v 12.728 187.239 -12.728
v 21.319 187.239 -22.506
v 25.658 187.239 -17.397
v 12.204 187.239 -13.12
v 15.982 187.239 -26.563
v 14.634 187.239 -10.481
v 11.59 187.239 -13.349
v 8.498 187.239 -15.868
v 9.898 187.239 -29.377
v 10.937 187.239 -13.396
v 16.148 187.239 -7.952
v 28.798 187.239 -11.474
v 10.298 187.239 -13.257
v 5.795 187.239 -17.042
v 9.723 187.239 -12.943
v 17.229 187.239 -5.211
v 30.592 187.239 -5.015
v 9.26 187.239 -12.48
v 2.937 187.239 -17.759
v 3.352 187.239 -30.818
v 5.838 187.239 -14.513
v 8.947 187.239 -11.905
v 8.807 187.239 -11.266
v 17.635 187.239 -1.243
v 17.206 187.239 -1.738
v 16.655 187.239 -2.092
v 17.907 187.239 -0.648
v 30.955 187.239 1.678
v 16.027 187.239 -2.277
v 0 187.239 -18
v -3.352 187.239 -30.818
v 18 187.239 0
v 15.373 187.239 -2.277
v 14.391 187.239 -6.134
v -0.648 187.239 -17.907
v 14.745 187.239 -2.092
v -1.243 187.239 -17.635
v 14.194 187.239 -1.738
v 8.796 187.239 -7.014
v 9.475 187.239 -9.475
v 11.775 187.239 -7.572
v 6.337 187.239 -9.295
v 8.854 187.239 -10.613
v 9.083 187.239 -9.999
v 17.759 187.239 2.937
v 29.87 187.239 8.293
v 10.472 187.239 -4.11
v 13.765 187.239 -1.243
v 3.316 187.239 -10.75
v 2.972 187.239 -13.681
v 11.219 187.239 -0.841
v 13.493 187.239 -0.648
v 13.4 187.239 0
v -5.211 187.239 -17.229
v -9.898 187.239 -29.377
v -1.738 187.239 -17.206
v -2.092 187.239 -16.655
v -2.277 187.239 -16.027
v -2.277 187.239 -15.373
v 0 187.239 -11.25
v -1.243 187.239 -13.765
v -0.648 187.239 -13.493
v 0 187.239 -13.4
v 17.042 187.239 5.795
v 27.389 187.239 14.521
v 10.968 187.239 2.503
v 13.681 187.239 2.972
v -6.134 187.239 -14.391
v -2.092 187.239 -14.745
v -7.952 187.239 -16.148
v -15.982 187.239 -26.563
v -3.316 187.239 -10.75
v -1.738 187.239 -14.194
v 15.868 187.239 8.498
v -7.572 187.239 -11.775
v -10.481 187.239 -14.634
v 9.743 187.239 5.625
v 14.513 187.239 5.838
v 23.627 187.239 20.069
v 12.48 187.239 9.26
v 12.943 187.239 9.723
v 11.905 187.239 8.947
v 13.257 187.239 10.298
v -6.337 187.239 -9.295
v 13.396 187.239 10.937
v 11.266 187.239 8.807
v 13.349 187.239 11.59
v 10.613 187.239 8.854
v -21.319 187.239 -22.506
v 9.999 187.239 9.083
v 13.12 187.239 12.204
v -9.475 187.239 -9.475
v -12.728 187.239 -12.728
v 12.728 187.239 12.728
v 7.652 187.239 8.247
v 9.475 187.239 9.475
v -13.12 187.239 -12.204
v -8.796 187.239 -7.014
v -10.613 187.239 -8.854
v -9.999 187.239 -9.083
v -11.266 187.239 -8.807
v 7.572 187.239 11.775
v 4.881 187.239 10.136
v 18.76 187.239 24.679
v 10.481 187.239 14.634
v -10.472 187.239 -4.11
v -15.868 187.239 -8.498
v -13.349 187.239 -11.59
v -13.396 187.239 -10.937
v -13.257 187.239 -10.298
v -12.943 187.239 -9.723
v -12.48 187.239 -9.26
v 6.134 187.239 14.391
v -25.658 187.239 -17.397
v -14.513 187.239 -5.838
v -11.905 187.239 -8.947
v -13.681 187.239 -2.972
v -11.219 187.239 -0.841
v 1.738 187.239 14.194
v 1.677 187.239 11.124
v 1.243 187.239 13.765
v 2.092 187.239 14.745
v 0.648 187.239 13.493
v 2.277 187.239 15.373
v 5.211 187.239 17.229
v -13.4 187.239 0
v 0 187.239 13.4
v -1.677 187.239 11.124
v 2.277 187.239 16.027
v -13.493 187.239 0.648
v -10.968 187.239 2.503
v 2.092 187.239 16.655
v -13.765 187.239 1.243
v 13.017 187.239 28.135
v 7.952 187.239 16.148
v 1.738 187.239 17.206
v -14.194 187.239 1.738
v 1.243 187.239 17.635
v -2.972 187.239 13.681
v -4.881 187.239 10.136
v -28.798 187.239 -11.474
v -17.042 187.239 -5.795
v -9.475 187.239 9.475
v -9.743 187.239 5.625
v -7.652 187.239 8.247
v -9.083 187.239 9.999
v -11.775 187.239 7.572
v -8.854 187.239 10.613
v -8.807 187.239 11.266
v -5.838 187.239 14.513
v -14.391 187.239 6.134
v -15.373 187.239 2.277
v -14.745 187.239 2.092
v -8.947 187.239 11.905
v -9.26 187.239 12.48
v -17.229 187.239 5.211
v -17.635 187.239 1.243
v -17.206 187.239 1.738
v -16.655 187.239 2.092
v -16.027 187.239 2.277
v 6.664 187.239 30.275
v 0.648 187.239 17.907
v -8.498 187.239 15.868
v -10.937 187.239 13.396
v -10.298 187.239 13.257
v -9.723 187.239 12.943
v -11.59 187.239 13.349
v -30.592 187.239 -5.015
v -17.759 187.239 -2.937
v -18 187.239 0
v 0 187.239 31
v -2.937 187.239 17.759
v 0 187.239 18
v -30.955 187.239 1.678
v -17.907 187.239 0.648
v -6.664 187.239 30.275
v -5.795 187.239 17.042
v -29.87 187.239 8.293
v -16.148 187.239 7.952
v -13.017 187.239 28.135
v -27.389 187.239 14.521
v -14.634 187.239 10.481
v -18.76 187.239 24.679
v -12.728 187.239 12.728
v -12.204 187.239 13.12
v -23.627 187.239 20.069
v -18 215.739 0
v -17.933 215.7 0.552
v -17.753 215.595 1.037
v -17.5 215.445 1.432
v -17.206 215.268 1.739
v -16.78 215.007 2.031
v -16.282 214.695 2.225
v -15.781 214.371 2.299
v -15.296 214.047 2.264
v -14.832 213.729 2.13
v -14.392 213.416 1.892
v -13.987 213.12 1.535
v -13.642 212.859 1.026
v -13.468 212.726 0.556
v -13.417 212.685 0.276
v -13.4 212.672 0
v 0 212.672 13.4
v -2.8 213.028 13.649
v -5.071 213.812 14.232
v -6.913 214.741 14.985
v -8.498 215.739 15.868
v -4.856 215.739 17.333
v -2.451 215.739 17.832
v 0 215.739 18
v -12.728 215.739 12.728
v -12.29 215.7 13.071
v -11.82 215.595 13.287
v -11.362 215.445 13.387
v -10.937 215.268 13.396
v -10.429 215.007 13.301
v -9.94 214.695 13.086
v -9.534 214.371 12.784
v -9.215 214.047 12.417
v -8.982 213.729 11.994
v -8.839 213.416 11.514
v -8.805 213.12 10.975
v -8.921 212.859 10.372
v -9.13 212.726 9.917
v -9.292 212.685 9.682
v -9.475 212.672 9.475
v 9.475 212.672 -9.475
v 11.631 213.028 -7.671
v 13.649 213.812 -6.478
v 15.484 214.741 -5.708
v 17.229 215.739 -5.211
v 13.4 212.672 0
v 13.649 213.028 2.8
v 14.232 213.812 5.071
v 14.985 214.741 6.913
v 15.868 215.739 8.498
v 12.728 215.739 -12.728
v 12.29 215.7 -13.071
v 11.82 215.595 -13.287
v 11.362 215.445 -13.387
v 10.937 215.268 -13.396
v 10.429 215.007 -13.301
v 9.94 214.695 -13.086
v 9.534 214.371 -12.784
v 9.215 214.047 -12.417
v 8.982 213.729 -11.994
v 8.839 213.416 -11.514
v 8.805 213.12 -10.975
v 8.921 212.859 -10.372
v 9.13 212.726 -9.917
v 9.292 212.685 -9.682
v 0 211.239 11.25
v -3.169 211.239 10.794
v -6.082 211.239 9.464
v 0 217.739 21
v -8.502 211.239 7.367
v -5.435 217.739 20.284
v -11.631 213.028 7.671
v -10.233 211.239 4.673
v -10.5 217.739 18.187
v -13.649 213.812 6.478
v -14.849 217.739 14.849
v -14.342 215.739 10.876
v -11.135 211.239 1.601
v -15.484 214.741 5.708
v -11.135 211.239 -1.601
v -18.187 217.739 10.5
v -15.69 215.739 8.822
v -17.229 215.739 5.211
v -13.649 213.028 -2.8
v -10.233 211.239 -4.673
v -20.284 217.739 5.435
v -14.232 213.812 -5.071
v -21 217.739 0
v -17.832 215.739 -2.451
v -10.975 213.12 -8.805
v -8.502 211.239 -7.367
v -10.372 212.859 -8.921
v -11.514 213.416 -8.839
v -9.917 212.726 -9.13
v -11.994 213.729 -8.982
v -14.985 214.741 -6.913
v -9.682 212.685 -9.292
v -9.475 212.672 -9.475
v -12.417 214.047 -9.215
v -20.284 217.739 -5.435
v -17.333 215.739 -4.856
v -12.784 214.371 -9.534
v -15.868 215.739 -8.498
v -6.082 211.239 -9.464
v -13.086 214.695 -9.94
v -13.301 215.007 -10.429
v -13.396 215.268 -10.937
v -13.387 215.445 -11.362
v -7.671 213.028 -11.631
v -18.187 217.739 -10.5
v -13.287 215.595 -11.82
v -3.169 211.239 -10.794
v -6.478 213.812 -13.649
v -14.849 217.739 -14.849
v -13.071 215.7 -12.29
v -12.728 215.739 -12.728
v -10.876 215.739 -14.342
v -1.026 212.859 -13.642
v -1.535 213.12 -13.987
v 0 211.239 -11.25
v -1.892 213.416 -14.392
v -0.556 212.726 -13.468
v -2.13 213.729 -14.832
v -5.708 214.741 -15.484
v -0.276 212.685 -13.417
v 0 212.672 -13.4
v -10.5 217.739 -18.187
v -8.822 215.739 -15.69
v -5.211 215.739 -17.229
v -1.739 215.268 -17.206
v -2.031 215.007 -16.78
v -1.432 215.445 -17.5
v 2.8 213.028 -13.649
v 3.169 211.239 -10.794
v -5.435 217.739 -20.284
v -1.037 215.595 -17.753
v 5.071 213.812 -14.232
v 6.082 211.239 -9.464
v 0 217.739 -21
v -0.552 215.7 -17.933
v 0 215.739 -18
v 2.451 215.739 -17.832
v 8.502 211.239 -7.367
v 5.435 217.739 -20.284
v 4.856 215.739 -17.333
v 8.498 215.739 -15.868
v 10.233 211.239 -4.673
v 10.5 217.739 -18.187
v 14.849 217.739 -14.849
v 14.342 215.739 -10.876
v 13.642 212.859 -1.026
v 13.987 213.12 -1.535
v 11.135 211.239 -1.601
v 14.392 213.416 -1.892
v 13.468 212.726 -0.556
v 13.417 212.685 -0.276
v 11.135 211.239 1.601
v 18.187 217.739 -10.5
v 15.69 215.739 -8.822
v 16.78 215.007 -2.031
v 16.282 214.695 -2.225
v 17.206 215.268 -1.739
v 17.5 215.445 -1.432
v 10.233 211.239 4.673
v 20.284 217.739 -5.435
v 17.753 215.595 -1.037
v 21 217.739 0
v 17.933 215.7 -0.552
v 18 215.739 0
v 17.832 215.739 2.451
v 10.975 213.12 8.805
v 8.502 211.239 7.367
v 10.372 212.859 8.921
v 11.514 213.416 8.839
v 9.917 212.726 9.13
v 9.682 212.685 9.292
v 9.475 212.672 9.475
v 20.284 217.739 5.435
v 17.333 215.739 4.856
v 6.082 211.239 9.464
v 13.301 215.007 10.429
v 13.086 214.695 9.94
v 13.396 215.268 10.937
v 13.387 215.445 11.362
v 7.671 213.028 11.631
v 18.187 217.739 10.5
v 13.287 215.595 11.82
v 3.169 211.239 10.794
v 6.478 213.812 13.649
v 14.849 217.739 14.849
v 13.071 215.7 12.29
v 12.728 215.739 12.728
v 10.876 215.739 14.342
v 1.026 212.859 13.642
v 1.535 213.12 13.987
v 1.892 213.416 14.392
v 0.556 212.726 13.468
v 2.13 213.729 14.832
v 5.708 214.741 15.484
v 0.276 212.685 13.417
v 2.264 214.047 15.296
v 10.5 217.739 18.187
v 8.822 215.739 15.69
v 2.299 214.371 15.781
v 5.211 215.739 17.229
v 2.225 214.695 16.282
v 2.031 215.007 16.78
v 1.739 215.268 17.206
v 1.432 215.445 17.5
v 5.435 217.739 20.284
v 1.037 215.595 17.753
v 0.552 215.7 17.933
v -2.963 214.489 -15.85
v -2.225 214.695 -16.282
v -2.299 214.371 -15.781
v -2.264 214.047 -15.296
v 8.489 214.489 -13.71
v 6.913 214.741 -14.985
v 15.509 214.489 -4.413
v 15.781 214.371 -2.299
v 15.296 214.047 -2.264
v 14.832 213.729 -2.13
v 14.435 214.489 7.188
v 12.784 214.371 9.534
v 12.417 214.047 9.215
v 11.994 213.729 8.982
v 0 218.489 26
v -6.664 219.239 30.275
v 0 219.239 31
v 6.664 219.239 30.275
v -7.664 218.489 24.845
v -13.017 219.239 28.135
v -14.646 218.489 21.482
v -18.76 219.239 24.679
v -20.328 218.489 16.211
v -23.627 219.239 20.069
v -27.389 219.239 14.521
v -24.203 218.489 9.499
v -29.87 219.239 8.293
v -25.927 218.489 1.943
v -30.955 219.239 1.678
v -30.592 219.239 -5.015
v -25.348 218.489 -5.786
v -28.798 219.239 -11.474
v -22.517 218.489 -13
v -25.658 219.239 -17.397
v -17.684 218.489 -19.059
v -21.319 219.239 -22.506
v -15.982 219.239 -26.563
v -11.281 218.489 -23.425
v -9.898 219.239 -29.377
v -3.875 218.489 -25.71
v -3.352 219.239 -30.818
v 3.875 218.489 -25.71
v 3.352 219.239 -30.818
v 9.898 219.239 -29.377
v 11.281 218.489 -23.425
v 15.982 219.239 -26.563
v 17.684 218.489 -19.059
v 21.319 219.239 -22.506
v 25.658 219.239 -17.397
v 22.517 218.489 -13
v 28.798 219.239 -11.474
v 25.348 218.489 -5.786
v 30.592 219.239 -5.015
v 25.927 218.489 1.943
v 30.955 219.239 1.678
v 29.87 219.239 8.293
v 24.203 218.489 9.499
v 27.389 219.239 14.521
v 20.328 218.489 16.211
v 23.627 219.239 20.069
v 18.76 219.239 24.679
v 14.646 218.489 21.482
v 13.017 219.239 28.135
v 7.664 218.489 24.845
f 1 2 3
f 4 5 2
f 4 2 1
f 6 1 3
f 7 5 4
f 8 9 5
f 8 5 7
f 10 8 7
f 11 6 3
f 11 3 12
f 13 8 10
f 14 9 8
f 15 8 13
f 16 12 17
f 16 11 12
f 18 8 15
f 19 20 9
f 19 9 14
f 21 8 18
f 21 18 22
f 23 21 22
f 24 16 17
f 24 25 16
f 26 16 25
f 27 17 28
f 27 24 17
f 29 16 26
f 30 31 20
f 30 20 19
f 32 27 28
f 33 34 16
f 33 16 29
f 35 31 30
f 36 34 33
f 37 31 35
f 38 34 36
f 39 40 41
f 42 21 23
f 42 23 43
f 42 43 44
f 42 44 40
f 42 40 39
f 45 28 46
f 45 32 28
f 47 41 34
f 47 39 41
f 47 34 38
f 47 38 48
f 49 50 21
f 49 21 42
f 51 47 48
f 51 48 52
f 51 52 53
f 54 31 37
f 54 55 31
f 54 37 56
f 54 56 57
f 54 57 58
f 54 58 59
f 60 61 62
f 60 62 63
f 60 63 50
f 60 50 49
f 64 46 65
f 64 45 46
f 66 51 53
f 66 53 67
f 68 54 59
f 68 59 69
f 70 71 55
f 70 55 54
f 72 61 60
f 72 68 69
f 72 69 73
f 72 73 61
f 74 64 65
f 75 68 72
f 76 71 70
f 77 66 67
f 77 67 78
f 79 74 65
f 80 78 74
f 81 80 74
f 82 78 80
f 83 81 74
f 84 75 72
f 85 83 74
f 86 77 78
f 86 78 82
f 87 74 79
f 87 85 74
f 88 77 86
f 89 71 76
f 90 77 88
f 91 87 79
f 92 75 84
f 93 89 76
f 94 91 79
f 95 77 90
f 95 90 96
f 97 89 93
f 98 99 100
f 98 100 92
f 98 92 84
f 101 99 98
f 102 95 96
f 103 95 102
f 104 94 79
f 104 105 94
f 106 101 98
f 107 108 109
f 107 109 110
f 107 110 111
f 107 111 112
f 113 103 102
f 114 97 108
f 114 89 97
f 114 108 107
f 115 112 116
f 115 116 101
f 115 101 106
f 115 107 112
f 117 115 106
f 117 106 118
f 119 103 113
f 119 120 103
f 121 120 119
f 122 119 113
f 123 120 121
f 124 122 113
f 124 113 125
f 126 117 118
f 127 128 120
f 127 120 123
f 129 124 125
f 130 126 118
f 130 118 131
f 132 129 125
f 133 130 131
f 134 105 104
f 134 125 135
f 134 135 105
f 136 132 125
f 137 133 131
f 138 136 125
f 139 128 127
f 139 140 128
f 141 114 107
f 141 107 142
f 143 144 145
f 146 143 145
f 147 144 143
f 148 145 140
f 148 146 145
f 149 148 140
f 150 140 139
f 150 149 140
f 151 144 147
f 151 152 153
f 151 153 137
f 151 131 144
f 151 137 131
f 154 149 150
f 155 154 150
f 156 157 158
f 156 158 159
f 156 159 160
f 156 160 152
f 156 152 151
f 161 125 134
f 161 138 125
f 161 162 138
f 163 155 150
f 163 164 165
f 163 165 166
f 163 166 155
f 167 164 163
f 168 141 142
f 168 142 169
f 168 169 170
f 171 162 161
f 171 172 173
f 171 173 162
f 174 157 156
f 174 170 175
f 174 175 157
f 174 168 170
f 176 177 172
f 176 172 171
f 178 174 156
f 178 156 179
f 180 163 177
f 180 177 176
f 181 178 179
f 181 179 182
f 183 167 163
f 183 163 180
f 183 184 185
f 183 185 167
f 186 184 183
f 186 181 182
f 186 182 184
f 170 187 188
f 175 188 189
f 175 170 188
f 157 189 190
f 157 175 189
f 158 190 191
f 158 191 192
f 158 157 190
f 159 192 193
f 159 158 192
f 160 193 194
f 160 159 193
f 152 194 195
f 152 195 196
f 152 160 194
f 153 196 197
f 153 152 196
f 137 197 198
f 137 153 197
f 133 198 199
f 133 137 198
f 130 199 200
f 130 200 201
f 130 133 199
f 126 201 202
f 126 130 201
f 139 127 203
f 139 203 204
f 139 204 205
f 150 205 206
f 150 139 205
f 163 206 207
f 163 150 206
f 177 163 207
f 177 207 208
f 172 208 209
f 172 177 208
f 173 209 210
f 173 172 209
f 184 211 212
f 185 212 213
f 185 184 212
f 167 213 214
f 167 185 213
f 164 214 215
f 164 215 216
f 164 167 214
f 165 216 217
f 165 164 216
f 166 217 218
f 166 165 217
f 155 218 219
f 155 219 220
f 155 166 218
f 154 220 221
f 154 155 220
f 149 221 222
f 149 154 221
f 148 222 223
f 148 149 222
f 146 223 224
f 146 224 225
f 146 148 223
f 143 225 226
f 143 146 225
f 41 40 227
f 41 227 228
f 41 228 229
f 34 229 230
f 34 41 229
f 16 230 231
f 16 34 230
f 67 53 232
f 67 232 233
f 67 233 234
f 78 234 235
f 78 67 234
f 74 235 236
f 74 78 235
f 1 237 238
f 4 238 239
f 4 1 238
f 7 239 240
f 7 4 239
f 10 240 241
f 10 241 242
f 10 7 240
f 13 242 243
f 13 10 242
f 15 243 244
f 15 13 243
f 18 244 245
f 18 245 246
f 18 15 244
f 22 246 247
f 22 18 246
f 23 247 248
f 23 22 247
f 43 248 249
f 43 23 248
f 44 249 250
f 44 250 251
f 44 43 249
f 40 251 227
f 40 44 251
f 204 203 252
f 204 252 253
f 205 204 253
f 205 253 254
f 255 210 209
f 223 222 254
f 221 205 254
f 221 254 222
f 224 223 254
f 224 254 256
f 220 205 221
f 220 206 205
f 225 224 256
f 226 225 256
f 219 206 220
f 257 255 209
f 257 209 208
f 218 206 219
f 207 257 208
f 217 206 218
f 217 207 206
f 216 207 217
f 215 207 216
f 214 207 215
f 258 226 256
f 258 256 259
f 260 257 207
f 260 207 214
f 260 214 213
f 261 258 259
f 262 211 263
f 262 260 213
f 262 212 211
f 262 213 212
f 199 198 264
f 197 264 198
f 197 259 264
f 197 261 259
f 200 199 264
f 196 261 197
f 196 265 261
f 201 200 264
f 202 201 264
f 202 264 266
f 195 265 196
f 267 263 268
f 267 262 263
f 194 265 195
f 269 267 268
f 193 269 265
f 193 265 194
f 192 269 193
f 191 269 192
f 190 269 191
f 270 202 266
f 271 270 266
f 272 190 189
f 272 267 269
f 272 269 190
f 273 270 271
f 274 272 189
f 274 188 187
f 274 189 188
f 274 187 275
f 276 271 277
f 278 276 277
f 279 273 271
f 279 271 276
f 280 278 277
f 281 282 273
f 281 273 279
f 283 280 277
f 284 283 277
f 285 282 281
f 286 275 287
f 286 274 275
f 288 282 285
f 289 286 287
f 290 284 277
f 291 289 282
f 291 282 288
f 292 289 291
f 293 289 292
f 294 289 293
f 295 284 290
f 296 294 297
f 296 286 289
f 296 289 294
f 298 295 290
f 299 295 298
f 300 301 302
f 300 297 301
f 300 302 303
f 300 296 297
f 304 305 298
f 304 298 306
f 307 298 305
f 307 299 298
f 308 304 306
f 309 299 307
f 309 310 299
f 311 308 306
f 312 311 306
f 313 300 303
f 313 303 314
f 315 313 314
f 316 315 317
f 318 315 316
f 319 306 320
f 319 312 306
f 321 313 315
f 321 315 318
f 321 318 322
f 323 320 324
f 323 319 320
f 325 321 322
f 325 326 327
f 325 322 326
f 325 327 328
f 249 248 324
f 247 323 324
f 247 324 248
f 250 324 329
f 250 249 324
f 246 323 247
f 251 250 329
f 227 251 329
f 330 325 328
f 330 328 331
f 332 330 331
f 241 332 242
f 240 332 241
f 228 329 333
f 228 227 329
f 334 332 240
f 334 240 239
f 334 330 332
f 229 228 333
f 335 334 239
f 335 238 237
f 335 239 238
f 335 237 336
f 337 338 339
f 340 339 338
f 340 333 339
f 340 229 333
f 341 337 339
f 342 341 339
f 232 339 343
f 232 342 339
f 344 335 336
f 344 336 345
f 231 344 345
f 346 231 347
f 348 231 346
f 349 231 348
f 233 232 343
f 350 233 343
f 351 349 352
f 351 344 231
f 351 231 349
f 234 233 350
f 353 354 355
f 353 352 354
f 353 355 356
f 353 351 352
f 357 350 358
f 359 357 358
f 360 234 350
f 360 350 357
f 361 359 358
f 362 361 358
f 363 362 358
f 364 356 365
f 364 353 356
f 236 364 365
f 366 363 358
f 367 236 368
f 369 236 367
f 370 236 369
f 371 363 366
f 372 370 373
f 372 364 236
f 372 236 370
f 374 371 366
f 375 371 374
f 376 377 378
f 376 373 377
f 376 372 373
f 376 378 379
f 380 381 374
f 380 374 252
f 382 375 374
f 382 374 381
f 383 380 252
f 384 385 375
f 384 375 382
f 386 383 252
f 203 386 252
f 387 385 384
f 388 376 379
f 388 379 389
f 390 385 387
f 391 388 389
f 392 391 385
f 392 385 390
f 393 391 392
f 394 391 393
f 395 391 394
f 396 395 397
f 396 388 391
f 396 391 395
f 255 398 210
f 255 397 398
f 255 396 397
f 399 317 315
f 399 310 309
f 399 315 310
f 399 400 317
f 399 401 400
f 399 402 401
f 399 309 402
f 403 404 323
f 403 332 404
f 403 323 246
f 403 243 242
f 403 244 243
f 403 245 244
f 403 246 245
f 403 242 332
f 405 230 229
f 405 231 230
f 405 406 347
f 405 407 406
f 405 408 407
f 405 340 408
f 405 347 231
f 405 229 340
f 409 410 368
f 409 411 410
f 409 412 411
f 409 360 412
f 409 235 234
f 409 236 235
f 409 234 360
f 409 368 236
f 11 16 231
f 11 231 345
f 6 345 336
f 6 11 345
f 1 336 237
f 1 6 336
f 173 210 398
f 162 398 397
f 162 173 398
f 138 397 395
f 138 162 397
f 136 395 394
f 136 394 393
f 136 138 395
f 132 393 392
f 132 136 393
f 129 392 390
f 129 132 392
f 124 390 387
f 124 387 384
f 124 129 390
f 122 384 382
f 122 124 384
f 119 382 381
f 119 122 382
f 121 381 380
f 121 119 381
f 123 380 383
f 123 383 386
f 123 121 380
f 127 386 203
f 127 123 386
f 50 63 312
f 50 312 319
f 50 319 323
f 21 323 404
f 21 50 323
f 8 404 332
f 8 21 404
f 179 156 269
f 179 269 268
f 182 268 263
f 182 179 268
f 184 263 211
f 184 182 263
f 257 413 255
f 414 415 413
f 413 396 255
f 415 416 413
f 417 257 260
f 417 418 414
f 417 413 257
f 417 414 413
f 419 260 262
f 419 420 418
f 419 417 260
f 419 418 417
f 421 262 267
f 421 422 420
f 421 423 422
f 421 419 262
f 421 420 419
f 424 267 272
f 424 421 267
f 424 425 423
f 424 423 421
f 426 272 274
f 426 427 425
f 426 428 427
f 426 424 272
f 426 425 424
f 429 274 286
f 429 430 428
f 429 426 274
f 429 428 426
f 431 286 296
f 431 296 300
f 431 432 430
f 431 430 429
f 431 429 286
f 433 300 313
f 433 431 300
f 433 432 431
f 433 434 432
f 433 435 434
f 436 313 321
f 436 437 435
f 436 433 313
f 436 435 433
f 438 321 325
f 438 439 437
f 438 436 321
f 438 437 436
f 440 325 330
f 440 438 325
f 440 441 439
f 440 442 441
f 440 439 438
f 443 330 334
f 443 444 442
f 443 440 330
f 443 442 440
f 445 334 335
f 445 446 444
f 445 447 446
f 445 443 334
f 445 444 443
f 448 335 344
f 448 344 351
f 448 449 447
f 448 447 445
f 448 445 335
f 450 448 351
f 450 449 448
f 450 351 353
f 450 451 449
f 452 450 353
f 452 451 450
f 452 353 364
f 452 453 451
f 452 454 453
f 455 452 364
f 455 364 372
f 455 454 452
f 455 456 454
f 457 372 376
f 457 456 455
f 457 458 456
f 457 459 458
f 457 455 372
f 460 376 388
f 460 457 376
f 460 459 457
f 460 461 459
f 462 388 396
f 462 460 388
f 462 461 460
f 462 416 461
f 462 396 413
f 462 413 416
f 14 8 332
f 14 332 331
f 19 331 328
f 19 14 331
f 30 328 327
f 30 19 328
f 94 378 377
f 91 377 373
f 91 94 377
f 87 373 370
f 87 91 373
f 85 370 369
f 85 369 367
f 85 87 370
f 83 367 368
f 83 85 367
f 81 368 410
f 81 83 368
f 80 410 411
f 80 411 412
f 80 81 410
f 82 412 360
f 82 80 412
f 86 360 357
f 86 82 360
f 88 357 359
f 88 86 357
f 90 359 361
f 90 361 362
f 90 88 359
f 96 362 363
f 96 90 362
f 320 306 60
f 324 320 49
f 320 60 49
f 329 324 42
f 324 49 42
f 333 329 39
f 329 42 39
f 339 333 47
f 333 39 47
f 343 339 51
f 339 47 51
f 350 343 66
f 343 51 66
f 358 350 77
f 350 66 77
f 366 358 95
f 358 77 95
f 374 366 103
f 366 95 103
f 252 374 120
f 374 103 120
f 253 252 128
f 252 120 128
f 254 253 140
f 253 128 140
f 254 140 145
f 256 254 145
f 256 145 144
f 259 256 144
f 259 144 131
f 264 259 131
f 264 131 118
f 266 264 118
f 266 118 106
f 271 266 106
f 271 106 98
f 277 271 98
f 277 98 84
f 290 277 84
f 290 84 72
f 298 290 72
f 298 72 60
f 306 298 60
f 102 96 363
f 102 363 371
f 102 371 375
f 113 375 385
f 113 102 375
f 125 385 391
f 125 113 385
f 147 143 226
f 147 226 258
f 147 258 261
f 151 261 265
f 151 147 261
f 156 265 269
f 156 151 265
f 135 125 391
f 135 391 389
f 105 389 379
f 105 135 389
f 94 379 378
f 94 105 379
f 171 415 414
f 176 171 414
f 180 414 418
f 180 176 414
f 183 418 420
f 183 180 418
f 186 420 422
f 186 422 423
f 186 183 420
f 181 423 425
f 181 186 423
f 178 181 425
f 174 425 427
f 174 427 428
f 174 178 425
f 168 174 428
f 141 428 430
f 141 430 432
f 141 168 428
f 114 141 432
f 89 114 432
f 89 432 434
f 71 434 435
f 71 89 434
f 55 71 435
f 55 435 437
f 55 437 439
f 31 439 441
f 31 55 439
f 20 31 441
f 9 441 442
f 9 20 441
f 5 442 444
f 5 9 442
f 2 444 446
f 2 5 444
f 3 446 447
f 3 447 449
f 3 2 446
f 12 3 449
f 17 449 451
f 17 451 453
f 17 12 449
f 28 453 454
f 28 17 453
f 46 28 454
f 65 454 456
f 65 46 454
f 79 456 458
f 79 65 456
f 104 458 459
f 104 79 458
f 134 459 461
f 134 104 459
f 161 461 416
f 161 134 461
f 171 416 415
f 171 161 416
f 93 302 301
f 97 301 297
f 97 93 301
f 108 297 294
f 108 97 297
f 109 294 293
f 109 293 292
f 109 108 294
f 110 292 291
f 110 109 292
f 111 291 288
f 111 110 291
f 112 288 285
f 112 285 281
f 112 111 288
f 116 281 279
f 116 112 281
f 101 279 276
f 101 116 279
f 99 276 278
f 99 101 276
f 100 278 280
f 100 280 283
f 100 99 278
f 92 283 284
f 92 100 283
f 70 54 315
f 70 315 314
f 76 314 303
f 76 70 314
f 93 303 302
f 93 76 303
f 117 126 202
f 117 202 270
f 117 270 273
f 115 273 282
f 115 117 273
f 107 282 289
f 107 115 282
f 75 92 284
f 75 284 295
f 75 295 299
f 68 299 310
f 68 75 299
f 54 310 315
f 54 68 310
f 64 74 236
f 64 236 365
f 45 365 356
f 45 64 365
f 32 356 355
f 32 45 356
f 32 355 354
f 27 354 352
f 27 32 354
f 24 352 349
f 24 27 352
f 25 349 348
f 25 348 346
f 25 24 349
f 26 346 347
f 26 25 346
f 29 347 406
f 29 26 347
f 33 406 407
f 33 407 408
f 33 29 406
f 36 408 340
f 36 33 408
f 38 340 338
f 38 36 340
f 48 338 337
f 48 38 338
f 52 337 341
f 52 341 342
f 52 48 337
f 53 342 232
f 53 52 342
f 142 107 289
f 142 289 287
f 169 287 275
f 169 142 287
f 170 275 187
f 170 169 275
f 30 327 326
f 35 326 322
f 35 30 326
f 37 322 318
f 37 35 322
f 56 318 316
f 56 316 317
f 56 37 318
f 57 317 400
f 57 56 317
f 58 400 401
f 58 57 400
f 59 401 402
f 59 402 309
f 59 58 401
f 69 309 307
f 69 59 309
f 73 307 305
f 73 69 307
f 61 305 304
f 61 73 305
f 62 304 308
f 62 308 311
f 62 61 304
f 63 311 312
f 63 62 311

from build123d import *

# Parameters (mm, degrees)
SKETCH_5_R          = 4
CUT_EXTRUDE_1_DEPTH = 55.27706698
CUT_EXTRUDE_2_DEPTH = 55.27706698
SKETCH_8_R          = 11.25
CUT_EXTRUDE_3_DEPTH = 55.27706698


with BuildPart() as part:
    # 草图3 → 旋转1 (revolve)
    with BuildSketch(Plane(origin=(0, 0, 0), x_dir=(0, 0, -1), z_dir=(1, 0, 0)), mode=Mode.PRIVATE) as revolve_1_sk:
        Polygon((0, 211.239142824), (11.25, 211.239142824), (21, 217.739142824), (31, 219.239142824), (31, 187.239142824), (0, 187.239142824), align=None)
    revolve(revolve_1_sk.sketch.rotate(Axis((0, 291.944884017, 0), (0, -1, 0)), 180), axis=Axis((0, 291.944884017, 0), (0, -1, 0)))

    # 草图5 → 切除-拉伸1 (cut, through all)
    with BuildSketch(Plane.XZ.offset(-187.239142824)):
        with Locations(Location((0, 0, 0), (0, 0, 270))):
            Circle(SKETCH_5_R)
    extrude(amount=-CUT_EXTRUDE_1_DEPTH, mode=Mode.SUBTRACT)

    # 草图6 → 切除-拉伸2 (cut, through all)
    with BuildSketch(Plane.XZ.offset(-187.239142824)):
        with BuildLine():
            ThreePointArc((-12.727922061, 12.727922061), (-9.475230868, 12.727922061), (-9.475230868, 9.475230868))
            ThreePointArc((-9.475230868, 9.475230868), (-13.048964597, 6.79154607), (-17.229268429, 5.210787791))
            ThreePointArc((-17.229268429, 5.210787791), (-15.442964172, 9.247424375), (-12.727922061, 12.727922061))
        make_face()
        with BuildLine():
            ThreePointArc((0, 18), (2.3, 15.7), (0, 13.4))
            ThreePointArc((0, 13.4), (-4.424663073, 14.029359635), (-8.498349158, 15.867515924))
            ThreePointArc((-8.498349158, 15.867515924), (-4.380908204, 17.458741172), (0, 18))
        make_face()
        with BuildLine():
            ThreePointArc((12.727922061, 12.727922061), (12.727922061, 9.475230868), (9.475230868, 9.475230868))
            ThreePointArc((9.475230868, 9.475230868), (6.79154607, 13.048964597), (5.210787791, 17.229268429))
            ThreePointArc((5.210787791, 17.229268429), (9.247424375, 15.442964172), (12.727922061, 12.727922061))
        make_face()
        with BuildLine():
            ThreePointArc((18, 0), (15.7, -2.3), (13.4, 0))
            ThreePointArc((13.4, 0), (14.029359635, 4.424663073), (15.867515924, 8.498349158))
            ThreePointArc((15.867515924, 8.498349158), (17.458741172, 4.380908204), (18, 0))
        make_face()
        with BuildLine():
            ThreePointArc((12.727922061, -12.727922061), (9.475230868, -12.727922061), (9.475230868, -9.475230868))
            ThreePointArc((9.475230868, -9.475230868), (13.048964597, -6.79154607), (17.229268429, -5.210787791))
            ThreePointArc((17.229268429, -5.210787791), (15.442964172, -9.247424375), (12.727922061, -12.727922061))
        make_face()
        with BuildLine():
            ThreePointArc((0, -18), (-2.3, -15.7), (0, -13.4))
            ThreePointArc((0, -13.4), (4.424663073, -14.029359635), (8.498349158, -15.867515924))
            ThreePointArc((8.498349158, -15.867515924), (4.380908204, -17.458741172), (0, -18))
        make_face()
        with BuildLine():
            ThreePointArc((-12.727922061, -12.727922061), (-12.727922061, -9.475230868), (-9.475230868, -9.475230868))
            ThreePointArc((-9.475230868, -9.475230868), (-6.79154607, -13.048964597), (-5.210787791, -17.229268429))
            ThreePointArc((-5.210787791, -17.229268429), (-9.247424375, -15.442964172), (-12.727922061, -12.727922061))
        make_face()
        with BuildLine():
            ThreePointArc((-13.4, 0), (-14.029359635, -4.424663073), (-15.867515924, -8.498349158))
            ThreePointArc((-15.867515924, -8.498349158), (-17.458741172, -4.380908204), (-18, 0))
            ThreePointArc((-18, 0), (-15.7, 2.3), (-13.4, 0))
        make_face()
    extrude(amount=-CUT_EXTRUDE_2_DEPTH, mode=Mode.SUBTRACT)

    # 草图8 → 切除-拉伸3 (cut, through all)
    with BuildSketch(Plane.XZ.offset(-187.239142824)):
        with Locations(Location((0, 0, 0), (0, 0, 270))):
            Circle(SKETCH_8_R)
    extrude(amount=-CUT_EXTRUDE_3_DEPTH, mode=Mode.SUBTRACT)


solid = part.part
